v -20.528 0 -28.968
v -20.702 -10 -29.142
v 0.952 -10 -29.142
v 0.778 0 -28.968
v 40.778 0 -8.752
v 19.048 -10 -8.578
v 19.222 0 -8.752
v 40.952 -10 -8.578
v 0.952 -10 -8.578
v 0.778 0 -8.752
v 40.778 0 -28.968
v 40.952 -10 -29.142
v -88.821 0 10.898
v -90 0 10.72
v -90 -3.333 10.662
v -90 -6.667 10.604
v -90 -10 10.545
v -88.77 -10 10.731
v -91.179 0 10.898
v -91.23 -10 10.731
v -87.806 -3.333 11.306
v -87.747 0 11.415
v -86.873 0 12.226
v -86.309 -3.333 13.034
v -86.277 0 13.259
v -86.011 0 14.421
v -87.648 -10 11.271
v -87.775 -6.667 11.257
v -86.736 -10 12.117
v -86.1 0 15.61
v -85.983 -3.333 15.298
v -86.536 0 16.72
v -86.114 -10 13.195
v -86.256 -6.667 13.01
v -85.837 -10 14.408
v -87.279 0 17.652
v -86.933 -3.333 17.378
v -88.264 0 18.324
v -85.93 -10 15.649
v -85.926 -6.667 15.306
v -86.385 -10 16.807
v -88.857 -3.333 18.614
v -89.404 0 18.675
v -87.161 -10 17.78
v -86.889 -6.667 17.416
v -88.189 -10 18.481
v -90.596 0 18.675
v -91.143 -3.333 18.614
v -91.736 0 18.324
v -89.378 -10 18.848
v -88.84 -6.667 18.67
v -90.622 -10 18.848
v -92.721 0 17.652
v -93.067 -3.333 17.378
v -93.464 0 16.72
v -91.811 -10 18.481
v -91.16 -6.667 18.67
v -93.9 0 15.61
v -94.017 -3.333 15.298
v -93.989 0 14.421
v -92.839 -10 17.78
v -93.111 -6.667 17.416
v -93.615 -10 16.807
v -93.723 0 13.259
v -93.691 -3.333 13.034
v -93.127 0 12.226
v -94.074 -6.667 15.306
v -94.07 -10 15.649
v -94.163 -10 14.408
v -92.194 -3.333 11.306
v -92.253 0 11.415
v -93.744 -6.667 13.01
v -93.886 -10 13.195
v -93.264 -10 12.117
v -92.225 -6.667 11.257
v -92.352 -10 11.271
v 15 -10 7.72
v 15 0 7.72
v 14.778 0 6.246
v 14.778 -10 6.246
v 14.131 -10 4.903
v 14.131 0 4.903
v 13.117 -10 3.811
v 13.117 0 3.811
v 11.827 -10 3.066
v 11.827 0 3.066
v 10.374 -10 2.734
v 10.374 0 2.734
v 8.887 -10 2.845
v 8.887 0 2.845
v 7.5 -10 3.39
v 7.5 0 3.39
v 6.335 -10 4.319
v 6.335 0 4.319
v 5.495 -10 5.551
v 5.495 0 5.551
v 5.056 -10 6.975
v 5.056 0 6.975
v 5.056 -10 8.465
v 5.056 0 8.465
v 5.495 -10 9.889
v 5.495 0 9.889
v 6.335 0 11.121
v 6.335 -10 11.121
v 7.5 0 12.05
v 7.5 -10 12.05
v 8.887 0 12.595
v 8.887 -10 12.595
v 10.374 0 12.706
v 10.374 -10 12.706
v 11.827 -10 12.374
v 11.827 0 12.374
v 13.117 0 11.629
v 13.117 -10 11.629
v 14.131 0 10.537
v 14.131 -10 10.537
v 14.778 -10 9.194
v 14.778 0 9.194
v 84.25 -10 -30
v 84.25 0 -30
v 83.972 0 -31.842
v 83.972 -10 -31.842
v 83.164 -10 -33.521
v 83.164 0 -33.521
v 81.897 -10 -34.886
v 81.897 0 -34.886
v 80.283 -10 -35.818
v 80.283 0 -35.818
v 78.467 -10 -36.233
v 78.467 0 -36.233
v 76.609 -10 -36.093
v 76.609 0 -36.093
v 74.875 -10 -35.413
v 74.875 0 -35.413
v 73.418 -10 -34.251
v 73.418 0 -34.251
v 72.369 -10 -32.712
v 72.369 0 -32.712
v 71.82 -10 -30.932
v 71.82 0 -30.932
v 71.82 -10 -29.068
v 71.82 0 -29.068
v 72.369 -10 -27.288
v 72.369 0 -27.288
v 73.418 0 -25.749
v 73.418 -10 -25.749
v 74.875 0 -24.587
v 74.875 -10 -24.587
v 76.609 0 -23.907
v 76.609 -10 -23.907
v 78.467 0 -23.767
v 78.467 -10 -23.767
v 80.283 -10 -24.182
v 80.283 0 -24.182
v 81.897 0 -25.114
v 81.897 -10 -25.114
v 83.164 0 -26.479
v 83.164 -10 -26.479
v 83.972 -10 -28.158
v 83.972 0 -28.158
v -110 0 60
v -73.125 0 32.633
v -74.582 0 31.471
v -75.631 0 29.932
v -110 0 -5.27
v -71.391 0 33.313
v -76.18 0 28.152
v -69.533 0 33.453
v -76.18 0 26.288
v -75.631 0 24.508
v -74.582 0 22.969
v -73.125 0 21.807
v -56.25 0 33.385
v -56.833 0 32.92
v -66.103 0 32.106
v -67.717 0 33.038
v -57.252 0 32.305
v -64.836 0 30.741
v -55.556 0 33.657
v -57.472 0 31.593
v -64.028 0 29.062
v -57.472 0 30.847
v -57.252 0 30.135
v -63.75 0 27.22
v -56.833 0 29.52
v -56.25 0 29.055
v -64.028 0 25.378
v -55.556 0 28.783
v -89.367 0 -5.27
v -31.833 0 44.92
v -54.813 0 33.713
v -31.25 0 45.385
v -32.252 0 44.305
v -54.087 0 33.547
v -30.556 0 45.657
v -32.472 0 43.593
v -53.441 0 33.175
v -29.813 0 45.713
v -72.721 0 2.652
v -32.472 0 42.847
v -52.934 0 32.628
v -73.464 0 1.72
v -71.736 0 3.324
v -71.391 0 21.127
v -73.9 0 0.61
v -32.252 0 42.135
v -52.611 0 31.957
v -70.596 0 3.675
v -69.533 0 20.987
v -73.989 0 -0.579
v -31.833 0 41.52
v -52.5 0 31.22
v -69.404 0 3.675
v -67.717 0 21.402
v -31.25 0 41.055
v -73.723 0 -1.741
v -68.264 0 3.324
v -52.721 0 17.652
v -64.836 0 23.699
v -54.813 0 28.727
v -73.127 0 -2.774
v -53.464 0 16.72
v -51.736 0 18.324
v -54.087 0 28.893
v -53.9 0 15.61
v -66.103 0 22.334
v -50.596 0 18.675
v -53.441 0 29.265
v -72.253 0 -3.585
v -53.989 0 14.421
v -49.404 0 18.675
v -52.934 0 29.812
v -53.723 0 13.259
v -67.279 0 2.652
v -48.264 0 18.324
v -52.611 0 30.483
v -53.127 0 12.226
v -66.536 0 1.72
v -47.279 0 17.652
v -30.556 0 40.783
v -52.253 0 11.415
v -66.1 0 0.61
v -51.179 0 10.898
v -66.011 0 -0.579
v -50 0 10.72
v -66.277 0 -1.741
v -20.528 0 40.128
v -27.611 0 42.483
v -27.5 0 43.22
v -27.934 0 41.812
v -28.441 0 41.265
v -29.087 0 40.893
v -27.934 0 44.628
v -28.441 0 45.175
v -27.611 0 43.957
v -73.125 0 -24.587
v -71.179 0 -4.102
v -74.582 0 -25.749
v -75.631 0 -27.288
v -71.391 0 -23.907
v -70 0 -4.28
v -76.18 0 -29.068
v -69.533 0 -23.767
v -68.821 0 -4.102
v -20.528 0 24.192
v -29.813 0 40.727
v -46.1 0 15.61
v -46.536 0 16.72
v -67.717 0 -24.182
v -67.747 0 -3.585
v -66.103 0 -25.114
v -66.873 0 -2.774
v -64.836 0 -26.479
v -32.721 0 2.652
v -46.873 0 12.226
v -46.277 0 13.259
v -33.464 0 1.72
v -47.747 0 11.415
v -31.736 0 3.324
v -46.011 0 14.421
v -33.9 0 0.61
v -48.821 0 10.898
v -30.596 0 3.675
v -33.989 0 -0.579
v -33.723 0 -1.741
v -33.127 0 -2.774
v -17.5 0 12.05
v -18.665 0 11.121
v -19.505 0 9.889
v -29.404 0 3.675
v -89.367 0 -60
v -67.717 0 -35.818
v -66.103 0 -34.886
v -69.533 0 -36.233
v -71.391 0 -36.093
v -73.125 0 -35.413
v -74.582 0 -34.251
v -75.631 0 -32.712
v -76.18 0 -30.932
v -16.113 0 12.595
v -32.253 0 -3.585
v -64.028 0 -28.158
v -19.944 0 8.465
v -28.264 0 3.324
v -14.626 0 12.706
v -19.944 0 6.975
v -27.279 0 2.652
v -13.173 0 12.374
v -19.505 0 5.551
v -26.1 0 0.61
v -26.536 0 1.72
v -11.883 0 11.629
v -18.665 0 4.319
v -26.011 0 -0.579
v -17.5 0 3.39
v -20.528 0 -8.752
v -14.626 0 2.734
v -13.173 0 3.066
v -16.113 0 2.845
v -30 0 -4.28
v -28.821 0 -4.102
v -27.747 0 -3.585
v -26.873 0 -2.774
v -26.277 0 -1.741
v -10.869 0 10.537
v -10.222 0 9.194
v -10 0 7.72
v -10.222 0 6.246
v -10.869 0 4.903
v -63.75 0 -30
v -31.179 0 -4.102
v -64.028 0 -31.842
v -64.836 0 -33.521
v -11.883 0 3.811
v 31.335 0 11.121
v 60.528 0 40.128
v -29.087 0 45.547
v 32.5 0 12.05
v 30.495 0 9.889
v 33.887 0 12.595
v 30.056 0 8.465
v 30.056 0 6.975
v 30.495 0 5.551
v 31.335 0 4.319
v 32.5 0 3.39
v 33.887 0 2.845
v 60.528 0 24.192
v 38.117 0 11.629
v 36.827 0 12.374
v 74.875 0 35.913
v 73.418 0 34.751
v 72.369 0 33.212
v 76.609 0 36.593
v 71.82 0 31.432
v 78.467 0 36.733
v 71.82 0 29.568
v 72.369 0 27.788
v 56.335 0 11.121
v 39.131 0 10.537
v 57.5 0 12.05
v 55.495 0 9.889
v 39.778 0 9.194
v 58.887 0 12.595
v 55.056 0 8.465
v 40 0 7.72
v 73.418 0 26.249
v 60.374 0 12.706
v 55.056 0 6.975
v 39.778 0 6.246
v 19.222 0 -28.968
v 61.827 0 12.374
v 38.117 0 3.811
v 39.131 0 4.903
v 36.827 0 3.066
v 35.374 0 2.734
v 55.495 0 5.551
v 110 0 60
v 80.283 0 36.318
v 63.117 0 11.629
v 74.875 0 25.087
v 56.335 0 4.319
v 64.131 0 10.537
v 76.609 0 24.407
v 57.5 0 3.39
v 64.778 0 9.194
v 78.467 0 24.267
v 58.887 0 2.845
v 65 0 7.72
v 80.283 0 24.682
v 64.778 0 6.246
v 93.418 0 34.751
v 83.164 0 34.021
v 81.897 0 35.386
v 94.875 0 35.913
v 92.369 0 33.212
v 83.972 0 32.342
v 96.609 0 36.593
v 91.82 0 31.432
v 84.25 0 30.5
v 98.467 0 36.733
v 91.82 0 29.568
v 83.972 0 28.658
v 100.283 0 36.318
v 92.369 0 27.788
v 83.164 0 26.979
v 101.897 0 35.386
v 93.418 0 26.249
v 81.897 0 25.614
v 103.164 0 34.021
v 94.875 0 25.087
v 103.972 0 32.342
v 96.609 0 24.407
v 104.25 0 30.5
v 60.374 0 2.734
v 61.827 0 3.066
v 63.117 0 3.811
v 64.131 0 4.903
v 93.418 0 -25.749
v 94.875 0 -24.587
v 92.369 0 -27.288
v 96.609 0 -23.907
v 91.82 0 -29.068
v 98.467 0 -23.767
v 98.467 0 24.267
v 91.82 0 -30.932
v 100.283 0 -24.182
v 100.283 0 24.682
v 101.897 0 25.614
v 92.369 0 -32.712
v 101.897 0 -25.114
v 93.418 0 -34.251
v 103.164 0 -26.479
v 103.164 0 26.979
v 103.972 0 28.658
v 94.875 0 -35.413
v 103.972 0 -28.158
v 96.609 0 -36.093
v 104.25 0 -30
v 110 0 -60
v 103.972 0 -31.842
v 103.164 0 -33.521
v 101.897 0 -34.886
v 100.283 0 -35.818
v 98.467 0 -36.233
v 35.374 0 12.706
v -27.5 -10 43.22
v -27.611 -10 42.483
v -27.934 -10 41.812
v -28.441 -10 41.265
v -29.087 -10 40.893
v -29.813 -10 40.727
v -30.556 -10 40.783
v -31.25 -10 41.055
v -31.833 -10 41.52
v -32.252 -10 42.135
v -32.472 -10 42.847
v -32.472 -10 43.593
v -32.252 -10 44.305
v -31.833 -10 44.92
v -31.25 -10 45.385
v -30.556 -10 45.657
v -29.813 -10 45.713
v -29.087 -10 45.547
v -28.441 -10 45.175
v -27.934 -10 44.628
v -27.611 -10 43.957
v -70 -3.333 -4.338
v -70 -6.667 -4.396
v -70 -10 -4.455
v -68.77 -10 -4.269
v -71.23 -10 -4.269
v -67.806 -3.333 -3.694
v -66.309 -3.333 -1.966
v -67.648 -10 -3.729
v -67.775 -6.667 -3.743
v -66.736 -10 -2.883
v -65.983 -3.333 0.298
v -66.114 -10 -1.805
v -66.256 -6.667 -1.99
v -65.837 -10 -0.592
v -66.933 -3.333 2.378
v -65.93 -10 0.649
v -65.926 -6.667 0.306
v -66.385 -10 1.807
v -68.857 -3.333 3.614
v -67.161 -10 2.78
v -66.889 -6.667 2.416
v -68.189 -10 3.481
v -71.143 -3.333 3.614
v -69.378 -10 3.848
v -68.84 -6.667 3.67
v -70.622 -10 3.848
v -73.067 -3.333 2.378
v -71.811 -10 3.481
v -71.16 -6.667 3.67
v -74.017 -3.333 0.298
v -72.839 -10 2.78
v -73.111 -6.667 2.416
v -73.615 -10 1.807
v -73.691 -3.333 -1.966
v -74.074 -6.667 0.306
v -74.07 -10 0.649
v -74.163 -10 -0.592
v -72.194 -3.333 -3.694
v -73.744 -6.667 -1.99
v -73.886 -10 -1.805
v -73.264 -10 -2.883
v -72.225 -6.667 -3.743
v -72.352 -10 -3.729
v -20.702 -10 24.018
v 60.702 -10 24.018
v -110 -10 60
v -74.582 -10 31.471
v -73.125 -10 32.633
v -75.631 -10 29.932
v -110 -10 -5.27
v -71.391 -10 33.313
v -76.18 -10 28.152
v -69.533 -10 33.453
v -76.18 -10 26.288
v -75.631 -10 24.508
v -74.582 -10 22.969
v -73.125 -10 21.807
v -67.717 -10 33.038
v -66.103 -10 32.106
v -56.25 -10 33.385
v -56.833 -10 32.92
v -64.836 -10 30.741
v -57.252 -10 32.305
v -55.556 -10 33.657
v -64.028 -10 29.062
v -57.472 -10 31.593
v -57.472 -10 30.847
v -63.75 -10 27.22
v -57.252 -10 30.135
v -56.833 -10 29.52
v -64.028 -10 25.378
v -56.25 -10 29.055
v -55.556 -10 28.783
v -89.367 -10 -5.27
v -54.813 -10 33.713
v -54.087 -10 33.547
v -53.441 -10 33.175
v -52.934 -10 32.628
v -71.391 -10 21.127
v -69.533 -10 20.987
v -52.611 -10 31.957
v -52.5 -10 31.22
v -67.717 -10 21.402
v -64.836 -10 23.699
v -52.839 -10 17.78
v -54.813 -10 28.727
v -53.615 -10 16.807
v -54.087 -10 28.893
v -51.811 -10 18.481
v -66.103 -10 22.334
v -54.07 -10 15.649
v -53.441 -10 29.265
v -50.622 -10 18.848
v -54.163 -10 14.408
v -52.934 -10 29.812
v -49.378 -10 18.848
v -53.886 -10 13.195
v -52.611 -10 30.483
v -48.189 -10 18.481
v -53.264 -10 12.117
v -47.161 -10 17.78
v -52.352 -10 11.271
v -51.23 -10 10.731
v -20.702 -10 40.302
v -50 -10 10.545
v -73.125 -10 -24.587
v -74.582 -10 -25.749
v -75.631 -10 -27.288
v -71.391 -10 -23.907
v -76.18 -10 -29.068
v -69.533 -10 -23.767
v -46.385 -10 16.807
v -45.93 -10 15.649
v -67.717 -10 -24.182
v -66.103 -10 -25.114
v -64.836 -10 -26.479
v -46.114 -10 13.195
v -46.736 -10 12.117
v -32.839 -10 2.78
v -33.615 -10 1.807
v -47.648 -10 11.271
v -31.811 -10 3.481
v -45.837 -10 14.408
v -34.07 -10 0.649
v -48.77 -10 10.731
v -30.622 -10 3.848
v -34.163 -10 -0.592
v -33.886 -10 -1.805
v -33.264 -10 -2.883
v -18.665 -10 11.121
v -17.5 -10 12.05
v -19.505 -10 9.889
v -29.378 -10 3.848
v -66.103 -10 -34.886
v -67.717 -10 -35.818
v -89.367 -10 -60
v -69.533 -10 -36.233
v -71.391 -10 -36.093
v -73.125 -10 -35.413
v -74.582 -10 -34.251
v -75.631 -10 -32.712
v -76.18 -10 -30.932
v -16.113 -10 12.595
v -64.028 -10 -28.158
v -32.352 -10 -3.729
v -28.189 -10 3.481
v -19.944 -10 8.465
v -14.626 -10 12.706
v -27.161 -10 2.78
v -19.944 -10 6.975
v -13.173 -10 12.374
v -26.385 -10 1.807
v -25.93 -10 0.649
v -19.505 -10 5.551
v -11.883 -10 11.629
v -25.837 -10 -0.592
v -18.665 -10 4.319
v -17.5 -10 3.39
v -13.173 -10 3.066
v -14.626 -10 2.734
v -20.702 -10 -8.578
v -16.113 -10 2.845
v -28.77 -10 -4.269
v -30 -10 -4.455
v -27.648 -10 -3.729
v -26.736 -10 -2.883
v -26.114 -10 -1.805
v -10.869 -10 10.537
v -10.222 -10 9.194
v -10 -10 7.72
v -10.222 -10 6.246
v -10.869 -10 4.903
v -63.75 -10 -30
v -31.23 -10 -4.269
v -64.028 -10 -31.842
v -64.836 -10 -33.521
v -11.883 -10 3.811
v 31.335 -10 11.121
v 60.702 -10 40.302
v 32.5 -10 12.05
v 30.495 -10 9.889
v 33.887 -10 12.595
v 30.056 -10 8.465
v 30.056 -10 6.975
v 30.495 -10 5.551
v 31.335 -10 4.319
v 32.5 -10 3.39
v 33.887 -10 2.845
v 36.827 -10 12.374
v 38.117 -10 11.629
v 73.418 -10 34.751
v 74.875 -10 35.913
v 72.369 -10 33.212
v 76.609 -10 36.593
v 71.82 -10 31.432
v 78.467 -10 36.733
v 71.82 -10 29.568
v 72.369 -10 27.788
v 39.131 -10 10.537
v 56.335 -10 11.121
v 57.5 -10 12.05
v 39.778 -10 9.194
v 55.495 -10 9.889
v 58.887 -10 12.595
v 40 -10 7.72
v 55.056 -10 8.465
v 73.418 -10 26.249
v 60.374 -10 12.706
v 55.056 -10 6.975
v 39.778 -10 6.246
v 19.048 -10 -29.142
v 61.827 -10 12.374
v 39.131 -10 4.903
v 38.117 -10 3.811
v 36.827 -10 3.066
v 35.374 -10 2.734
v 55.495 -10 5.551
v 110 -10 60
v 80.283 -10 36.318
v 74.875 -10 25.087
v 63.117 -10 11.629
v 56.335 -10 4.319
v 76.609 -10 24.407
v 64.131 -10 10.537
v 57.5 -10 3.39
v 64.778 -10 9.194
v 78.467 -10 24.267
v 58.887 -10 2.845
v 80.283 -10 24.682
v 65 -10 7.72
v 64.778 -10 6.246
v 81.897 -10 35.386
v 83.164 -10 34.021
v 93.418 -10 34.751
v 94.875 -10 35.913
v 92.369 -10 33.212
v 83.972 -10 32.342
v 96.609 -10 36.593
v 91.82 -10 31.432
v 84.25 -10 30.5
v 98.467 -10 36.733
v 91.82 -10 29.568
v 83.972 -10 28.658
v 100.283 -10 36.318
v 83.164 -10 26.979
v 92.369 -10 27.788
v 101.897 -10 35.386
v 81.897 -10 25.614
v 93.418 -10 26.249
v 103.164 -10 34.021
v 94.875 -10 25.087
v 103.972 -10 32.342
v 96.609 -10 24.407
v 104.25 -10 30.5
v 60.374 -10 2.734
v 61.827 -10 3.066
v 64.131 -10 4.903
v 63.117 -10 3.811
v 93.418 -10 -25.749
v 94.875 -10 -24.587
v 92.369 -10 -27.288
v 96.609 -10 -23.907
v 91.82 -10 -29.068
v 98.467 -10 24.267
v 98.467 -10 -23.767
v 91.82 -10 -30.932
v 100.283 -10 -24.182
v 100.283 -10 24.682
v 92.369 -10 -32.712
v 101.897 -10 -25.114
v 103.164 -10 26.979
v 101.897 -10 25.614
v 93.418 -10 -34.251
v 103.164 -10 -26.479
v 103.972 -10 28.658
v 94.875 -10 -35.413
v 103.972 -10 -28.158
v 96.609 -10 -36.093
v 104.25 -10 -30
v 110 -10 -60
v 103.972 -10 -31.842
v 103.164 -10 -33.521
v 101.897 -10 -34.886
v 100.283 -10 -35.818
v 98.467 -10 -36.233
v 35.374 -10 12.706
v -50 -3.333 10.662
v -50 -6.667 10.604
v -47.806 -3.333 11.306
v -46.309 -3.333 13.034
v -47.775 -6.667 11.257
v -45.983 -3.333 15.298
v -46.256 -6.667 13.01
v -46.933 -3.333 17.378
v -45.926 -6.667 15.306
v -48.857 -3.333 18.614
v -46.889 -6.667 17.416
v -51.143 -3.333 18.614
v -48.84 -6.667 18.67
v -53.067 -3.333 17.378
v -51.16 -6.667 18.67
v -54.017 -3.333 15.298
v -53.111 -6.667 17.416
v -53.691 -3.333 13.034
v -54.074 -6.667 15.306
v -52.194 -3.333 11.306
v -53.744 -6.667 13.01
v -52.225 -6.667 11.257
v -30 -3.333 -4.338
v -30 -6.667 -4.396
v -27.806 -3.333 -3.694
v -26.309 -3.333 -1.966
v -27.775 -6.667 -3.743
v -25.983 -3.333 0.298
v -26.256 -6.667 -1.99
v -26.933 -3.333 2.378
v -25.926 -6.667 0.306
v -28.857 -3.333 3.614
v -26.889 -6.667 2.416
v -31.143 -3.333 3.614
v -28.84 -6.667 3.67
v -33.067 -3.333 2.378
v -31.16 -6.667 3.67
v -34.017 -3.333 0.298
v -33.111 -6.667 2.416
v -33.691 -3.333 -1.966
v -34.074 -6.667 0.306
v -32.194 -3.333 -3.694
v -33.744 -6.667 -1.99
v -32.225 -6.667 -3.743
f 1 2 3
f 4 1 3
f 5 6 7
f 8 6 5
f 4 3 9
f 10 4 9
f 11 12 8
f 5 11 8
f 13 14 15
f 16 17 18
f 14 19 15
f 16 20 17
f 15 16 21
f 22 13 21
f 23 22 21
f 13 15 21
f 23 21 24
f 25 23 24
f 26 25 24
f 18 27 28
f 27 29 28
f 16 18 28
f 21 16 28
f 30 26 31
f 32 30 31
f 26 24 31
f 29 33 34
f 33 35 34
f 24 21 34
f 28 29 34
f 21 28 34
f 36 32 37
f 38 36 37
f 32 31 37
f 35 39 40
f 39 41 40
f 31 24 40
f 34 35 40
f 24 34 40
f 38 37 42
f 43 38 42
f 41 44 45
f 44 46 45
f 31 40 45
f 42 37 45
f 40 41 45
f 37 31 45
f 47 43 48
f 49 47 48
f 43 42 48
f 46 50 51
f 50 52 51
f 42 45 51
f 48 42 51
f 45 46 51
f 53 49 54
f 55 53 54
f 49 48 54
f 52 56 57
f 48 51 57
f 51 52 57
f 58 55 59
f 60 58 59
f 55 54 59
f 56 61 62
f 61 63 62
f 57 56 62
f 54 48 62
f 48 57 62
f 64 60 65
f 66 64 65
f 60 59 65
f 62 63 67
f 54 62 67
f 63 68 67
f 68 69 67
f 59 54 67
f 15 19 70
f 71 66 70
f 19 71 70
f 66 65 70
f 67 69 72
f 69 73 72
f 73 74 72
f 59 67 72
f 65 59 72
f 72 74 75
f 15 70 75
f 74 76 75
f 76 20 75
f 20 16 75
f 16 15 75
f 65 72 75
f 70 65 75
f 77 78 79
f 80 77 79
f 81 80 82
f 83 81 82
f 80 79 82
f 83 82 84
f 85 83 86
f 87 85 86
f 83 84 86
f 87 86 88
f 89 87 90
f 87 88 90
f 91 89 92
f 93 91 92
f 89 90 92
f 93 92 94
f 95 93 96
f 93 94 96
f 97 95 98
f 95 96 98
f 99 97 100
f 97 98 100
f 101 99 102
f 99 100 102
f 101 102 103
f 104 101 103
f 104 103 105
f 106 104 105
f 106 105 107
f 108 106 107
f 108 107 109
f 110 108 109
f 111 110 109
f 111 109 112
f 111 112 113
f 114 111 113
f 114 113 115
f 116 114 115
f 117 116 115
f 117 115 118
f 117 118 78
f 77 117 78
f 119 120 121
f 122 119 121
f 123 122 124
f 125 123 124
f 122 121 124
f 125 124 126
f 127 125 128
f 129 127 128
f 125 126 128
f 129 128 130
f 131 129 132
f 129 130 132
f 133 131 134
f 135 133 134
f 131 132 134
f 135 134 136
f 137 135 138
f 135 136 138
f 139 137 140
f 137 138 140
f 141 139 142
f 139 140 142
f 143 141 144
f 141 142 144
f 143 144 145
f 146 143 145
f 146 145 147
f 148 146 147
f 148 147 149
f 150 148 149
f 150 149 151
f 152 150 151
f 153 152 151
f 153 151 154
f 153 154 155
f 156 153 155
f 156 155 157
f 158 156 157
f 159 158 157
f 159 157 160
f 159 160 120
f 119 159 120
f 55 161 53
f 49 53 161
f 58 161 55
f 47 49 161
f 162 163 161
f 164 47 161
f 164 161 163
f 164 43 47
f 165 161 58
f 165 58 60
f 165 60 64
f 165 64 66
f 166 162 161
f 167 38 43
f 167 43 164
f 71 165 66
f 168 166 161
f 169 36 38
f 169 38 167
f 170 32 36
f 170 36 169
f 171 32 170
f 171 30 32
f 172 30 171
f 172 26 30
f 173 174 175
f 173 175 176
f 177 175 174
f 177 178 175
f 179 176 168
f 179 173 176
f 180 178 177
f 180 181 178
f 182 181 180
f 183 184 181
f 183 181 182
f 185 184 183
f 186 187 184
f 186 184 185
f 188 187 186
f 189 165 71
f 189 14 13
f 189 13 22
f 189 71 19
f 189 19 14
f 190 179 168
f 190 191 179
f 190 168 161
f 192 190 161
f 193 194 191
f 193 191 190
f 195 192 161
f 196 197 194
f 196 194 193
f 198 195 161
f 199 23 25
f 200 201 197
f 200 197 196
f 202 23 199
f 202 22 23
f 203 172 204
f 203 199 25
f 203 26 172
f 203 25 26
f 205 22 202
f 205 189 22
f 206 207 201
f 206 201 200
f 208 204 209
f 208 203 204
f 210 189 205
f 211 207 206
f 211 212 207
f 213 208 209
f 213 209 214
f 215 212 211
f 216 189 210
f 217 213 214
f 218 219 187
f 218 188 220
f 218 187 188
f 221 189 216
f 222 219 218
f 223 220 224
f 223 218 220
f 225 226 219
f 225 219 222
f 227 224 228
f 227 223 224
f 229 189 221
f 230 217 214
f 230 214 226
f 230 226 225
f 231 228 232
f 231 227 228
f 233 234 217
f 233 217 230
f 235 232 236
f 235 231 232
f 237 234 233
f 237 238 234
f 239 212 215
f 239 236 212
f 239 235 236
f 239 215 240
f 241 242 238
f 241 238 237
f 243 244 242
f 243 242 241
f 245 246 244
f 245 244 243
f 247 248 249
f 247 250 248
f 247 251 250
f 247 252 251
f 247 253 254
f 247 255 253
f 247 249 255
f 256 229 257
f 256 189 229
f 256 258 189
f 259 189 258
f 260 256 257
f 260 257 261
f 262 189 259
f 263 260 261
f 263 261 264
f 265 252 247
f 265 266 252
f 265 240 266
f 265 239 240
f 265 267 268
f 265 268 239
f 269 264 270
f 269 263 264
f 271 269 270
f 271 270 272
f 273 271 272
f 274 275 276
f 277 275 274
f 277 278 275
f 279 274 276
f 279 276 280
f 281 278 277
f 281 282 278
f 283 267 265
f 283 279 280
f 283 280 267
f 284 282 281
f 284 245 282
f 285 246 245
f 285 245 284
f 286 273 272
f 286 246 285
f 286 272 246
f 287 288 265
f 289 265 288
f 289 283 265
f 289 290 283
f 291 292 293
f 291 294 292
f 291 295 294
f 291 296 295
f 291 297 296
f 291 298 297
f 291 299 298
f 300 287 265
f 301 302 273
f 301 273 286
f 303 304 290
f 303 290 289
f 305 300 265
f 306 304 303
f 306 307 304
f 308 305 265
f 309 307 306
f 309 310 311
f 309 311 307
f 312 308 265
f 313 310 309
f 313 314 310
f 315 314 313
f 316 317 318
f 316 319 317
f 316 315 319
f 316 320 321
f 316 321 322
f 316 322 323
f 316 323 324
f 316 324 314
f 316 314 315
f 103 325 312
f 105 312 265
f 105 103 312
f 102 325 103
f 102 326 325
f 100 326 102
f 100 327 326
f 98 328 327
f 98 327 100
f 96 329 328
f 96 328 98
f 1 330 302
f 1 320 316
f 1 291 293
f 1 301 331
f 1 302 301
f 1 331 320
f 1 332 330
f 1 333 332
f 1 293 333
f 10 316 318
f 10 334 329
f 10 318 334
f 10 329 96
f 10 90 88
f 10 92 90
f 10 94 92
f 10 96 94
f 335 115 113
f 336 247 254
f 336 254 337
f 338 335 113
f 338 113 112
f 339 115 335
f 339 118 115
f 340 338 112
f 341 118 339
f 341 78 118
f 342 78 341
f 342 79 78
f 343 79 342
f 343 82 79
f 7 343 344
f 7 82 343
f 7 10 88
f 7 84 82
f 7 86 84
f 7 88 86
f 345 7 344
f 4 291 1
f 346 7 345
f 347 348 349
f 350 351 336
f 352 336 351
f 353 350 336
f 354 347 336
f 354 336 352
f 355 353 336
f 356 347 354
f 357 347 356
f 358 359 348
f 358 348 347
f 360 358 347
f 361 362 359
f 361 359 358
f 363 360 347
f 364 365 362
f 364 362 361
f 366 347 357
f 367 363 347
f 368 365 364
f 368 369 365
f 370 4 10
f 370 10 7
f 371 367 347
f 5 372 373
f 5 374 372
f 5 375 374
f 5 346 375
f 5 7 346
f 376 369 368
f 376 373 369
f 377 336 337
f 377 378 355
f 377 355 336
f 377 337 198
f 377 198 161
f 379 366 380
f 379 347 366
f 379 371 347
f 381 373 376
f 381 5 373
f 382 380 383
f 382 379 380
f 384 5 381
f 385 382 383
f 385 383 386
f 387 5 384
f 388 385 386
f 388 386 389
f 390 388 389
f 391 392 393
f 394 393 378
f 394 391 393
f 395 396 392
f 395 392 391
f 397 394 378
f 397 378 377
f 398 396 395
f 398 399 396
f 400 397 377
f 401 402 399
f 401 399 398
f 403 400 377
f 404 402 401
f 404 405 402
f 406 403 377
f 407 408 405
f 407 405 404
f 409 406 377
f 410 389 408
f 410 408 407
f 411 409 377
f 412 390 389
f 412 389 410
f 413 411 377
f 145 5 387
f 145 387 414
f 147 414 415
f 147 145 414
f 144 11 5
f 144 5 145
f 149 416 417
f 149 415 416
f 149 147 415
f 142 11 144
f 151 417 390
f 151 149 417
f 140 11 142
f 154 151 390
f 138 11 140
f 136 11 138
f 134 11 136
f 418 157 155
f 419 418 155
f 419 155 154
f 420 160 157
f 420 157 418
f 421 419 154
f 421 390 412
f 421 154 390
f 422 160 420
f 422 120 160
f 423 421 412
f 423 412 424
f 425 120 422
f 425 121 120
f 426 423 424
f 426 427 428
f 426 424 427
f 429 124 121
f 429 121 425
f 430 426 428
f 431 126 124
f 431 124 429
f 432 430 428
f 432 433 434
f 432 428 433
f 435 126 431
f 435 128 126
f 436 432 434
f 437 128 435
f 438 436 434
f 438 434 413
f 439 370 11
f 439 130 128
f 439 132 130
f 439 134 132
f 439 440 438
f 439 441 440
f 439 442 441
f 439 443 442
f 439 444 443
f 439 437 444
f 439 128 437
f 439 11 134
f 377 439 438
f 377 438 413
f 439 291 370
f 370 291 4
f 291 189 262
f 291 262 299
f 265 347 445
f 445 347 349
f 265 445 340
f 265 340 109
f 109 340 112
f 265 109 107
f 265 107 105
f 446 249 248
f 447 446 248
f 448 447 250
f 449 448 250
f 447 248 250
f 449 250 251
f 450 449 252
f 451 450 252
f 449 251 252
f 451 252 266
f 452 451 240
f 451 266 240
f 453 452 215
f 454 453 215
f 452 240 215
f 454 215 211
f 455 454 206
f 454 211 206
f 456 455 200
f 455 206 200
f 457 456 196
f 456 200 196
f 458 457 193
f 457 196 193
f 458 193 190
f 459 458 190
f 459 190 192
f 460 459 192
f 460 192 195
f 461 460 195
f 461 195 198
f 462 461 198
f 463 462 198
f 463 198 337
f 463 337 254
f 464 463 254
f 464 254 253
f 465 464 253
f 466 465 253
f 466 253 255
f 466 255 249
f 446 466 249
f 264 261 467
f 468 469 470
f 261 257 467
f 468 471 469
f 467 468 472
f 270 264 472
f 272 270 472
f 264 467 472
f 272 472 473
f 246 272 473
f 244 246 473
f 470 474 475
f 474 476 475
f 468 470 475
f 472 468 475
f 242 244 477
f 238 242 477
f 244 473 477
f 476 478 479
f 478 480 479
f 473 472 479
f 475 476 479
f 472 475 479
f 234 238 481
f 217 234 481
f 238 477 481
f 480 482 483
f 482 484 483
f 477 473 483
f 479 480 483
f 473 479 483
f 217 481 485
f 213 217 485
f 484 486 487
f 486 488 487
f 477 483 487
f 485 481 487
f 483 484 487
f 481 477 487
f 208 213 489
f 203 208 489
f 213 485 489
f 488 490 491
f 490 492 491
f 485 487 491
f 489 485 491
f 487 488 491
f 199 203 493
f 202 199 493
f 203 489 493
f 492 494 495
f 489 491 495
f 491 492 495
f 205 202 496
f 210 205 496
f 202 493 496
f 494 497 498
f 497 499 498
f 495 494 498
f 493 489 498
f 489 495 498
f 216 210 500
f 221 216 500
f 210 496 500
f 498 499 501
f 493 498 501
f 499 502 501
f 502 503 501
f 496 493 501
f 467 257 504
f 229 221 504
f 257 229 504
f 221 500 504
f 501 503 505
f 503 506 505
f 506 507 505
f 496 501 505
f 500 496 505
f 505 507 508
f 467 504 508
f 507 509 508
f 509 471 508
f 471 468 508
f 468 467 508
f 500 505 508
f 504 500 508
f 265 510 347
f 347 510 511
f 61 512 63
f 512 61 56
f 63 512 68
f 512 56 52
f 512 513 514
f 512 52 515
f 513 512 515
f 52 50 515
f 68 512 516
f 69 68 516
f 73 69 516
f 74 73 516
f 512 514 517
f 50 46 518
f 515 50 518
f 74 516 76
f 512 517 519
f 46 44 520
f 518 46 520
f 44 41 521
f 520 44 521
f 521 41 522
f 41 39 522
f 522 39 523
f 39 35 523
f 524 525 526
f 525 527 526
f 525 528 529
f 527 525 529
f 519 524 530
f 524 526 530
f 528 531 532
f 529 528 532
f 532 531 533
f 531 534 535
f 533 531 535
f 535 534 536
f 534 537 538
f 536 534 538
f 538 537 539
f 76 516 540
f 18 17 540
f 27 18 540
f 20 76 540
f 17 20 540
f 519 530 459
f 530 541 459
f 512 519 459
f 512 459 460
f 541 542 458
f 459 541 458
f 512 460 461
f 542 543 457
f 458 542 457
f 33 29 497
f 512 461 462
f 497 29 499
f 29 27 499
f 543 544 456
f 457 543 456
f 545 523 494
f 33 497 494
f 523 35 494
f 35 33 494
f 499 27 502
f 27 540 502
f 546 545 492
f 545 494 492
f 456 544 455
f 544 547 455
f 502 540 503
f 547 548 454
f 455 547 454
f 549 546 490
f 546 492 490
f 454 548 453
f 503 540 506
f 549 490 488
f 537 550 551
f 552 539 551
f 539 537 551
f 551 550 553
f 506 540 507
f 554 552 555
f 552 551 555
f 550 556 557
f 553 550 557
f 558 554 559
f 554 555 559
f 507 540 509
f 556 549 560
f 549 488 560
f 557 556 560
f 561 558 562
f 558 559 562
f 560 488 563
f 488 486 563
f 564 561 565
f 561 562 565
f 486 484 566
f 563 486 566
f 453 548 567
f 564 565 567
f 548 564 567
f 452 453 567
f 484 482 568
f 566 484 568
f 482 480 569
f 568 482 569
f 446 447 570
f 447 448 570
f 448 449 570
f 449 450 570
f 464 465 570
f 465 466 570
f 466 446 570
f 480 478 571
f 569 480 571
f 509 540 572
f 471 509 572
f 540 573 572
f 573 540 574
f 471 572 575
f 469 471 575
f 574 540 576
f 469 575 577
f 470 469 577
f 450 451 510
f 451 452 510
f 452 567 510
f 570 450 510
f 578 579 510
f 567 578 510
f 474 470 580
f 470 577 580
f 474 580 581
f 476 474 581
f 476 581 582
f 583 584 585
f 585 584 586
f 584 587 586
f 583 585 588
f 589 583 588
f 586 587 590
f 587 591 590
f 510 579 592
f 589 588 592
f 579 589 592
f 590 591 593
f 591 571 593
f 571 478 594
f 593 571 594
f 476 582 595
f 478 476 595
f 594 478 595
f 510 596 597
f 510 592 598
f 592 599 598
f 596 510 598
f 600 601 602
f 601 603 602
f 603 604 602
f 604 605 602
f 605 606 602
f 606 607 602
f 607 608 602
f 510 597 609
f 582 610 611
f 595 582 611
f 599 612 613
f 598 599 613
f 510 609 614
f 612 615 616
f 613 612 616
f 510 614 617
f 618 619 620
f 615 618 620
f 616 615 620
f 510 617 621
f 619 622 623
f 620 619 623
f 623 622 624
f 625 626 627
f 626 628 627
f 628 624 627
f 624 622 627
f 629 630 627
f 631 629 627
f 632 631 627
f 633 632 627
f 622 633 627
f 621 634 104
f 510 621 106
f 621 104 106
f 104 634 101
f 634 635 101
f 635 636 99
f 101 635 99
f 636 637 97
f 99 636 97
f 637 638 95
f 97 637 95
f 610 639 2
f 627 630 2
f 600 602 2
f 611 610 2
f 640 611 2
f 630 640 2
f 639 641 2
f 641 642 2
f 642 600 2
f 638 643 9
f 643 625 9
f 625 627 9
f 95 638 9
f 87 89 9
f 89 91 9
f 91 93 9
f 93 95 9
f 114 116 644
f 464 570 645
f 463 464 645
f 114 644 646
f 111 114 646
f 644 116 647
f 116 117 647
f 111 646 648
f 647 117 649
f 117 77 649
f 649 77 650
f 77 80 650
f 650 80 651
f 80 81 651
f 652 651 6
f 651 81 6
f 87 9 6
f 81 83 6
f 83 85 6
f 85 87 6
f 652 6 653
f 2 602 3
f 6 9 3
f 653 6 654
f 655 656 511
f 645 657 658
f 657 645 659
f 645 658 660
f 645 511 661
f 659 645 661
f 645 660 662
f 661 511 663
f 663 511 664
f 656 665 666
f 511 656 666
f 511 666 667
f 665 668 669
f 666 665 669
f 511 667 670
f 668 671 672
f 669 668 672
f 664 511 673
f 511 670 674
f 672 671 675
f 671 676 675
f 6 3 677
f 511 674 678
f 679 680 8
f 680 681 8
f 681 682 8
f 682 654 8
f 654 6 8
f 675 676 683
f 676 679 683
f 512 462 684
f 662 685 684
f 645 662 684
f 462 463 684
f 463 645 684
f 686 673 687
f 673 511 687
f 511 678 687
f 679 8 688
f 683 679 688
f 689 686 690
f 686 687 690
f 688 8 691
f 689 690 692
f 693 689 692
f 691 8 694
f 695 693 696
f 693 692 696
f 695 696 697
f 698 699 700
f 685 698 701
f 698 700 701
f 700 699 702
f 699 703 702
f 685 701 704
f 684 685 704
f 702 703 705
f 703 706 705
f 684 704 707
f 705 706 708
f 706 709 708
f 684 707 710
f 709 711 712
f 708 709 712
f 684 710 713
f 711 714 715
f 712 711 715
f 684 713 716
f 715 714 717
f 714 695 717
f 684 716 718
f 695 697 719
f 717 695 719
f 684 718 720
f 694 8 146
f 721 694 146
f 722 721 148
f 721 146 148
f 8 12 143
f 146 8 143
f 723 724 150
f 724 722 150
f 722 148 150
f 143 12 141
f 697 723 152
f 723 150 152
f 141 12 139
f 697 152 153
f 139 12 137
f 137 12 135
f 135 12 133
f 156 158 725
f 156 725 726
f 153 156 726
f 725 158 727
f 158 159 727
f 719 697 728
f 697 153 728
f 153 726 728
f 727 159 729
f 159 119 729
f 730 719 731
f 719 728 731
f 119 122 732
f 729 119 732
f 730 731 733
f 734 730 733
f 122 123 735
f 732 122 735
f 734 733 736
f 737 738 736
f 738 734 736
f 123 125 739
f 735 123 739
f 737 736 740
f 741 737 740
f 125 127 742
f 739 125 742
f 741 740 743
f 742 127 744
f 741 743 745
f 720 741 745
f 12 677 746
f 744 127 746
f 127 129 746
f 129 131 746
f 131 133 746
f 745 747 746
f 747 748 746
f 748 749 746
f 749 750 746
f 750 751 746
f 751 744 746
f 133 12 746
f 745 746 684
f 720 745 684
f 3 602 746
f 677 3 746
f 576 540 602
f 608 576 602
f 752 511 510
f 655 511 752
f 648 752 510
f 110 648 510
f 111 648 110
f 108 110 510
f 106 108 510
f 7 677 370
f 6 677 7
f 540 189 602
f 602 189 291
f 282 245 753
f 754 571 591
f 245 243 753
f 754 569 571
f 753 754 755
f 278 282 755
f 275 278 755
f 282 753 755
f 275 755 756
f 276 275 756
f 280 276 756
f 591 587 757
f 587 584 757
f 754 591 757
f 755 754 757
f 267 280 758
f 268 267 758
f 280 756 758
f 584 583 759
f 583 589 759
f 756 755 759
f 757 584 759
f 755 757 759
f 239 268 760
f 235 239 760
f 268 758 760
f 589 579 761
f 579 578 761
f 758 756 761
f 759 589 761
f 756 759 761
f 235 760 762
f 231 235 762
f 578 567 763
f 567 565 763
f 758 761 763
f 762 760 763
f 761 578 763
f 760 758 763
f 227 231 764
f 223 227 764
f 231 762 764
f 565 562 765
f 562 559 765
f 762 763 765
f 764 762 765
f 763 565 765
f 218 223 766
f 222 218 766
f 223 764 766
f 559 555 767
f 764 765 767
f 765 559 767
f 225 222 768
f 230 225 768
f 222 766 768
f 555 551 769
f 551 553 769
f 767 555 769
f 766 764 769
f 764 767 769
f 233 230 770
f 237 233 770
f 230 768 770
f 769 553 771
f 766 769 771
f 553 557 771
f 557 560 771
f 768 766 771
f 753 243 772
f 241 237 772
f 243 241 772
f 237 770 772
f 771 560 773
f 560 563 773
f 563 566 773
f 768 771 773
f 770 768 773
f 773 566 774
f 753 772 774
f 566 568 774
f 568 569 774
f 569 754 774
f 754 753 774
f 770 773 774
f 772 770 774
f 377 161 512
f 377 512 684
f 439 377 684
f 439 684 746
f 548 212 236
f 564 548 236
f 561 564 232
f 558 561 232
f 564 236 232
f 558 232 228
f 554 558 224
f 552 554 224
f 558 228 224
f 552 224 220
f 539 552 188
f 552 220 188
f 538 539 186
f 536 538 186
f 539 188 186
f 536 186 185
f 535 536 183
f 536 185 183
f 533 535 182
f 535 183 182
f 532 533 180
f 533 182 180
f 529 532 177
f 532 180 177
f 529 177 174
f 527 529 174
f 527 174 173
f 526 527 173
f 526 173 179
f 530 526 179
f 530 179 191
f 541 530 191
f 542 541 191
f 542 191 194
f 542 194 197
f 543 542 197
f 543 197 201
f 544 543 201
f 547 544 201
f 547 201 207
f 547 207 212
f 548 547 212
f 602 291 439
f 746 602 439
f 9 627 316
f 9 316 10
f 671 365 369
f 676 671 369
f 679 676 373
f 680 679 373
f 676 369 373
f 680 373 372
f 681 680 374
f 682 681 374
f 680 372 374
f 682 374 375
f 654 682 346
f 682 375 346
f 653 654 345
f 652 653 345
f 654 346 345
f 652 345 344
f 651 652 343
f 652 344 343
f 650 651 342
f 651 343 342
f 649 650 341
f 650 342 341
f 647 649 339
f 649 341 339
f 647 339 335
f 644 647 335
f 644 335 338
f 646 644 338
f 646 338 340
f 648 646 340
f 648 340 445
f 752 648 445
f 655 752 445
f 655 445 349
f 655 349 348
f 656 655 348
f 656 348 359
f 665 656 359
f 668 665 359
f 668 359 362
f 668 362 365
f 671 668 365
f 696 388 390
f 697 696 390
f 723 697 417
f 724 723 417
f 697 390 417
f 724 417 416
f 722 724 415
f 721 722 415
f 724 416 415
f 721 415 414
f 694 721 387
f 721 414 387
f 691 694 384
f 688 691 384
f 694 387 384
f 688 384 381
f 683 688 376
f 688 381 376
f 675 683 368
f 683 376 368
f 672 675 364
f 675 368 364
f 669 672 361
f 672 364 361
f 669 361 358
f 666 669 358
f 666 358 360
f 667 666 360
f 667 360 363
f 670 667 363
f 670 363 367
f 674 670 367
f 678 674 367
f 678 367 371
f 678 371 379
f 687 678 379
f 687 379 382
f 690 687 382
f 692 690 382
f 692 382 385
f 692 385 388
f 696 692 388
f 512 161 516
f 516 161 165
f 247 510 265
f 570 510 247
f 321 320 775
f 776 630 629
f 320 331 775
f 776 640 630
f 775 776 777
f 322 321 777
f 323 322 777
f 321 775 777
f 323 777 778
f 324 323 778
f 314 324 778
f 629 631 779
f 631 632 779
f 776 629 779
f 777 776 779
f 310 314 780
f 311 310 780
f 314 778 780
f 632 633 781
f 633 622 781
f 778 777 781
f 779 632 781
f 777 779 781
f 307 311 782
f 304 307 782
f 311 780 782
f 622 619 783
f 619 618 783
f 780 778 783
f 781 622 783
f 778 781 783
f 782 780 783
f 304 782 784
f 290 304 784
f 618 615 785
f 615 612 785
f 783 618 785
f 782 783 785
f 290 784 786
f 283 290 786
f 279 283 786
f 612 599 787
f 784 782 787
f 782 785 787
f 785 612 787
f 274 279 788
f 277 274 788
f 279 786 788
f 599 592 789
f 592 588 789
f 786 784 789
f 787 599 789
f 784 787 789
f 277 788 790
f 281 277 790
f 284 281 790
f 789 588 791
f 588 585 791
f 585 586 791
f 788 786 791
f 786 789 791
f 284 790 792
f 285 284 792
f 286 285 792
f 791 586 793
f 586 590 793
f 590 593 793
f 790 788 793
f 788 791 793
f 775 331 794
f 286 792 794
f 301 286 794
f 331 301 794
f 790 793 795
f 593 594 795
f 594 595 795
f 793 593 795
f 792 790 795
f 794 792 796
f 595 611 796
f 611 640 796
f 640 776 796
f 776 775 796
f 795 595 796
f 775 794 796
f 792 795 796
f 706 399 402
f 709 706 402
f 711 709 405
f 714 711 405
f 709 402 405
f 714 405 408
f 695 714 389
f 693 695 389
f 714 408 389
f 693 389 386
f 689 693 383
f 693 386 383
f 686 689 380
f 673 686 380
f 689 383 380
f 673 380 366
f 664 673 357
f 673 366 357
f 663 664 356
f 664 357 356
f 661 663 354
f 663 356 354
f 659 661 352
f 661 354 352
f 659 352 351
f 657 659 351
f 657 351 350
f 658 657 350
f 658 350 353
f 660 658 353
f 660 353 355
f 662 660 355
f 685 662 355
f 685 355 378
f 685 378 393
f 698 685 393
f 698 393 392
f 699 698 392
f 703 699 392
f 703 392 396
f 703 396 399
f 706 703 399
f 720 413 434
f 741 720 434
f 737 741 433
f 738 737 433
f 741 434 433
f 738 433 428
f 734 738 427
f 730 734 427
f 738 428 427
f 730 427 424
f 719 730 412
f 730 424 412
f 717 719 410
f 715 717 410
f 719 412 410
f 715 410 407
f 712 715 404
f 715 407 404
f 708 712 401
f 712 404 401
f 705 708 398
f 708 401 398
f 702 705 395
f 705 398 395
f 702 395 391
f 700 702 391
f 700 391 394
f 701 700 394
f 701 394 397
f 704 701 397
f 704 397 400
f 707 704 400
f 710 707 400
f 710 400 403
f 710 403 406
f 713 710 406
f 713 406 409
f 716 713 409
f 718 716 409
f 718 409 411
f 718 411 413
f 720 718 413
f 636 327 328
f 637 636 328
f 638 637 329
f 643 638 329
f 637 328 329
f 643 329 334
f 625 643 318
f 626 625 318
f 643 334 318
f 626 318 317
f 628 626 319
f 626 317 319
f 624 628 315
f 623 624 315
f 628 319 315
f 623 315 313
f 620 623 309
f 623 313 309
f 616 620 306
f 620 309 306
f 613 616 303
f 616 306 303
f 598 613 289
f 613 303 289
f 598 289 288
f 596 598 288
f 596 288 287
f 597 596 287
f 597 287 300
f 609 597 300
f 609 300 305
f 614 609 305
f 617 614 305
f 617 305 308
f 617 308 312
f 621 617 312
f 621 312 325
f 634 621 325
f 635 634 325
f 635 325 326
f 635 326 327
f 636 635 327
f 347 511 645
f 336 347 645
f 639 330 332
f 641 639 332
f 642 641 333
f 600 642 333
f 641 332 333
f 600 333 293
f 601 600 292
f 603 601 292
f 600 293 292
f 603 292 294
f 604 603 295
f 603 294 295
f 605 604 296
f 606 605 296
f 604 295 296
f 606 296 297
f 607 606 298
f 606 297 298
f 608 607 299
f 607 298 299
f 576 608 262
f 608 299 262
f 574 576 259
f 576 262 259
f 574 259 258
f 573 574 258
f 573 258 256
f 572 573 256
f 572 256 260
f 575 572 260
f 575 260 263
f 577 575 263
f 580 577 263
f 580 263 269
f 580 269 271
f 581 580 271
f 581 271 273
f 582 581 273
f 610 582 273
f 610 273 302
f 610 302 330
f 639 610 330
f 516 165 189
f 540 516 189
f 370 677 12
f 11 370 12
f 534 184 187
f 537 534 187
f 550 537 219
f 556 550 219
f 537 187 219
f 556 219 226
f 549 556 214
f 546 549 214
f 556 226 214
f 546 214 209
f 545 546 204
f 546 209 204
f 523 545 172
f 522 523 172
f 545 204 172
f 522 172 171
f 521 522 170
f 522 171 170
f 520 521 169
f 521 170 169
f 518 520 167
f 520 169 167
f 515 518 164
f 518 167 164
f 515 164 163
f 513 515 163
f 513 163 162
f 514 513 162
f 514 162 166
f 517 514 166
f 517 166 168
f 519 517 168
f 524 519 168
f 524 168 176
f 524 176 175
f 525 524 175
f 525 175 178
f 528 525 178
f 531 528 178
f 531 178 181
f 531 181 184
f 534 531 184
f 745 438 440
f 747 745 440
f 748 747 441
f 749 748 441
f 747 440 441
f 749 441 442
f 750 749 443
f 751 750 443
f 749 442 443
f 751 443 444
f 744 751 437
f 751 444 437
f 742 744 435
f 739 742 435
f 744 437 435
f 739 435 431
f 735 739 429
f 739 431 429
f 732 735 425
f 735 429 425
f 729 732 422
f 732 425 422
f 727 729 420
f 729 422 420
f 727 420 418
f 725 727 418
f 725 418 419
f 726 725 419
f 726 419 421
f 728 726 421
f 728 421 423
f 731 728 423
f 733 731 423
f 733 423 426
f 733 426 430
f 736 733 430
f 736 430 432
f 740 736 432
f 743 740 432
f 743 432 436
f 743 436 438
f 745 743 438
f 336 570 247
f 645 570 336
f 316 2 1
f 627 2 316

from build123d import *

# Parameters (mm, degrees)
SKETCH1_W                    = 220
SKETCH1_H                    = 120
BOSS_EXTRUDE1_DEPTH          = 10
CUT_EXTRUDE1_REACH           = 127.698
SKETCH2_W                    = 20.632503002
SKETCH2_H                    = 54.730004003
F_12_5_12_5_DIAMETER_HOLE1_D = 12.5
F_10_0_10_DIAMETER_HOLE1_D   = 10
F_5_0MM_DOWEL_HOLE1_D        = 5
CUT_EXTRUDE2_REACH           = 127.698
SKETCH12_R                   = 4
SKETCH12_W                   = 81.05559148
SKETCH12_H                   = 15.93559148
SKETCH12_W_2                 = 21.30559148
SKETCH12_H_2                 = 20.21559148
SKETCH12_W_3                 = 21.55559148
DRAFT1_ANGLE                 = -1


with BuildPart() as part:
    # Sketch1 → Boss-Extrude1 (new body)
    with BuildSketch(Plane(origin=(0, 0, 0), x_dir=(1, 0, 0), z_dir=(0, 1, 0))):
        Rectangle(SKETCH1_W, SKETCH1_H)
    extrude(amount=-BOSS_EXTRUDE1_DEPTH)

    # Sketch2 → Cut-Extrude1 (cut, up to next)
    with BuildSketch(Plane(origin=(0, 0, 0), x_dir=(1, 0, 0), z_dir=(0, 1, 0)), mode=Mode.PRIVATE) as cut_extrude1_sk1:
        with Locations((-99.683748499, 32.634997999)):
            Rectangle(SKETCH2_W, SKETCH2_H)
    cut_extrude1_tool1 = extrude(cut_extrude1_sk1.sketch, amount=-CUT_EXTRUDE1_REACH, mode=Mode.PRIVATE) & part.part
    add(cut_extrude1_tool1.solids().sort_by_distance((-99.683748, 0, -32.634998))[0], mode=Mode.SUBTRACT)

    # Ø12.5 (12.5) Diameter Hole1 (through all)
    with Locations(Plane(origin=(0, -10, 0), x_dir=(-1, 0, 0), z_dir=(0, -1, 0))):
        with Locations((-98, 30), (-78, 30), (70, 30), (-98, -30.5), (-78, -30.5), (70, -27.22)):
            Hole(F_12_5_12_5_DIAMETER_HOLE1_D / 2)

    # Ø10.0 (10) Diameter Hole1 (through all)
    with Locations(Plane(origin=(0, -10, 0), x_dir=(-1, 0, 0), z_dir=(0, -1, 0))):
        with Locations((-60, -7.72), (-35, -7.72), (-10, -7.72), (15, -7.72)):
            Hole(F_10_0_10_DIAMETER_HOLE1_D / 2)

    # Ø5.0mm Dowel Hole1 (through all)
    with Locations(Plane(origin=(0, -10, 0), x_dir=(-1, 0, 0), z_dir=(0, -1, 0))):
        with Locations((30, -43.22), (55, -31.22)):
            Hole(F_5_0MM_DOWEL_HOLE1_D / 2)

    # Sketch12 → Cut-Extrude2 (cut, up to next)
    with BuildSketch(Plane.XZ.offset(10), mode=Mode.PRIVATE) as cut_extrude2_sk1:
        with Locations(Location((-90, 14.72, 0), (0, 0, 270))):
            Circle(SKETCH12_R)
    cut_extrude2_tool1 = extrude(cut_extrude2_sk1.sketch, amount=-CUT_EXTRUDE2_REACH, mode=Mode.PRIVATE) & part.part
    # Sketch12 → Cut-Extrude2 (cut, up to next)
    with BuildSketch(Plane.XZ.offset(10), mode=Mode.PRIVATE) as cut_extrude2_sk2:
        with Locations(Location((-70, -0.28, 0), (0, 0, 270))):
            Circle(SKETCH12_R)
    cut_extrude2_tool2 = extrude(cut_extrude2_sk2.sketch, amount=-CUT_EXTRUDE2_REACH, mode=Mode.PRIVATE) & part.part
    # Sketch12 → Cut-Extrude2 (cut, up to next)
    with BuildSketch(Plane.XZ.offset(10), mode=Mode.PRIVATE) as cut_extrude2_sk3:
        with Locations(Location((-50, 14.72, 0), (0, 0, 270))):
            Circle(SKETCH12_R)
    cut_extrude2_tool3 = extrude(cut_extrude2_sk3.sketch, amount=-CUT_EXTRUDE2_REACH, mode=Mode.PRIVATE) & part.part
    # Sketch12 → Cut-Extrude2 (cut, up to next)
    with BuildSketch(Plane.XZ.offset(10), mode=Mode.PRIVATE) as cut_extrude2_sk4:
        with Locations(Location((-30, -0.28, 0), (0, 0, 270))):
            Circle(SKETCH12_R)
    cut_extrude2_tool4 = extrude(cut_extrude2_sk4.sketch, amount=-CUT_EXTRUDE2_REACH, mode=Mode.PRIVATE) & part.part
    # Sketch12 → Cut-Extrude2 (cut, up to next)
    with BuildSketch(Plane.XZ.offset(10), mode=Mode.PRIVATE) as cut_extrude2_sk5:
        with Locations((20, 32.16)):
            Rectangle(SKETCH12_W, SKETCH12_H)
    cut_extrude2_tool5 = extrude(cut_extrude2_sk5.sketch, amount=-CUT_EXTRUDE2_REACH, mode=Mode.PRIVATE) & part.part
    # Sketch12 → Cut-Extrude2 (cut, up to next)
    with BuildSketch(Plane.XZ.offset(10), mode=Mode.PRIVATE) as cut_extrude2_sk6:
        with Locations((-9.875, -18.86)):
            Rectangle(SKETCH12_W_2, SKETCH12_H_2)
    cut_extrude2_tool6 = extrude(cut_extrude2_sk6.sketch, amount=-CUT_EXTRUDE2_REACH, mode=Mode.PRIVATE) & part.part
    # Sketch12 → Cut-Extrude2 (cut, up to next)
    with BuildSketch(Plane.XZ.offset(10), mode=Mode.PRIVATE) as cut_extrude2_sk7:
        with Locations((30, -18.86)):
            Rectangle(SKETCH12_W_3, SKETCH12_H_2)
    cut_extrude2_tool7 = extrude(cut_extrude2_sk7.sketch, amount=-CUT_EXTRUDE2_REACH, mode=Mode.PRIVATE) & part.part
    add(cut_extrude2_tool1.solids().sort_by_distance((-90, -10, 14.72))[0], mode=Mode.SUBTRACT)
    add(cut_extrude2_tool2.solids().sort_by_distance((-70, -10, -0.28))[0], mode=Mode.SUBTRACT)
    add(cut_extrude2_tool3.solids().sort_by_distance((-50, -10, 14.72))[0], mode=Mode.SUBTRACT)
    add(cut_extrude2_tool4.solids().sort_by_distance((-30, -10, -0.28))[0], mode=Mode.SUBTRACT)
    add(cut_extrude2_tool5.solids().sort_by_distance((20, -10, 32.16))[0], mode=Mode.SUBTRACT)
    add(cut_extrude2_tool6.solids().sort_by_distance((-9.875, -10, -18.86))[0], mode=Mode.SUBTRACT)
    add(cut_extrude2_tool7.solids().sort_by_distance((30, -10, -18.86))[0], mode=Mode.SUBTRACT)

    # Draft1
    draft1_faces = [part.faces().sort_by_distance(p)[0] for p in [
        (60.52779574, -5, 32.16),
        (20, -5, 40.12779574),
        (-20.52779574, -5, 32.16),
        (20, -5, 24.19220426),
        (-9.875, -5, -8.75220426),
        (30, -5, -8.75220426),
        (40.77779574, -5, -18.86),
        (0.77779574, -5, -18.86),
        (-20.52779574, -5, -18.86),
        (19.22220426, -5, -18.86),
        (30, -5, -28.96779574),
        (-9.875, -5, -28.96779574),
        (-50, -5, 18.72),
        (-30, -5, 3.72),
        (-70, -5, 3.72),
        (-90, -5, 18.72),
    ]]
    draft(draft1_faces, Plane.ZX, DRAFT1_ANGLE)


solid = part.part
